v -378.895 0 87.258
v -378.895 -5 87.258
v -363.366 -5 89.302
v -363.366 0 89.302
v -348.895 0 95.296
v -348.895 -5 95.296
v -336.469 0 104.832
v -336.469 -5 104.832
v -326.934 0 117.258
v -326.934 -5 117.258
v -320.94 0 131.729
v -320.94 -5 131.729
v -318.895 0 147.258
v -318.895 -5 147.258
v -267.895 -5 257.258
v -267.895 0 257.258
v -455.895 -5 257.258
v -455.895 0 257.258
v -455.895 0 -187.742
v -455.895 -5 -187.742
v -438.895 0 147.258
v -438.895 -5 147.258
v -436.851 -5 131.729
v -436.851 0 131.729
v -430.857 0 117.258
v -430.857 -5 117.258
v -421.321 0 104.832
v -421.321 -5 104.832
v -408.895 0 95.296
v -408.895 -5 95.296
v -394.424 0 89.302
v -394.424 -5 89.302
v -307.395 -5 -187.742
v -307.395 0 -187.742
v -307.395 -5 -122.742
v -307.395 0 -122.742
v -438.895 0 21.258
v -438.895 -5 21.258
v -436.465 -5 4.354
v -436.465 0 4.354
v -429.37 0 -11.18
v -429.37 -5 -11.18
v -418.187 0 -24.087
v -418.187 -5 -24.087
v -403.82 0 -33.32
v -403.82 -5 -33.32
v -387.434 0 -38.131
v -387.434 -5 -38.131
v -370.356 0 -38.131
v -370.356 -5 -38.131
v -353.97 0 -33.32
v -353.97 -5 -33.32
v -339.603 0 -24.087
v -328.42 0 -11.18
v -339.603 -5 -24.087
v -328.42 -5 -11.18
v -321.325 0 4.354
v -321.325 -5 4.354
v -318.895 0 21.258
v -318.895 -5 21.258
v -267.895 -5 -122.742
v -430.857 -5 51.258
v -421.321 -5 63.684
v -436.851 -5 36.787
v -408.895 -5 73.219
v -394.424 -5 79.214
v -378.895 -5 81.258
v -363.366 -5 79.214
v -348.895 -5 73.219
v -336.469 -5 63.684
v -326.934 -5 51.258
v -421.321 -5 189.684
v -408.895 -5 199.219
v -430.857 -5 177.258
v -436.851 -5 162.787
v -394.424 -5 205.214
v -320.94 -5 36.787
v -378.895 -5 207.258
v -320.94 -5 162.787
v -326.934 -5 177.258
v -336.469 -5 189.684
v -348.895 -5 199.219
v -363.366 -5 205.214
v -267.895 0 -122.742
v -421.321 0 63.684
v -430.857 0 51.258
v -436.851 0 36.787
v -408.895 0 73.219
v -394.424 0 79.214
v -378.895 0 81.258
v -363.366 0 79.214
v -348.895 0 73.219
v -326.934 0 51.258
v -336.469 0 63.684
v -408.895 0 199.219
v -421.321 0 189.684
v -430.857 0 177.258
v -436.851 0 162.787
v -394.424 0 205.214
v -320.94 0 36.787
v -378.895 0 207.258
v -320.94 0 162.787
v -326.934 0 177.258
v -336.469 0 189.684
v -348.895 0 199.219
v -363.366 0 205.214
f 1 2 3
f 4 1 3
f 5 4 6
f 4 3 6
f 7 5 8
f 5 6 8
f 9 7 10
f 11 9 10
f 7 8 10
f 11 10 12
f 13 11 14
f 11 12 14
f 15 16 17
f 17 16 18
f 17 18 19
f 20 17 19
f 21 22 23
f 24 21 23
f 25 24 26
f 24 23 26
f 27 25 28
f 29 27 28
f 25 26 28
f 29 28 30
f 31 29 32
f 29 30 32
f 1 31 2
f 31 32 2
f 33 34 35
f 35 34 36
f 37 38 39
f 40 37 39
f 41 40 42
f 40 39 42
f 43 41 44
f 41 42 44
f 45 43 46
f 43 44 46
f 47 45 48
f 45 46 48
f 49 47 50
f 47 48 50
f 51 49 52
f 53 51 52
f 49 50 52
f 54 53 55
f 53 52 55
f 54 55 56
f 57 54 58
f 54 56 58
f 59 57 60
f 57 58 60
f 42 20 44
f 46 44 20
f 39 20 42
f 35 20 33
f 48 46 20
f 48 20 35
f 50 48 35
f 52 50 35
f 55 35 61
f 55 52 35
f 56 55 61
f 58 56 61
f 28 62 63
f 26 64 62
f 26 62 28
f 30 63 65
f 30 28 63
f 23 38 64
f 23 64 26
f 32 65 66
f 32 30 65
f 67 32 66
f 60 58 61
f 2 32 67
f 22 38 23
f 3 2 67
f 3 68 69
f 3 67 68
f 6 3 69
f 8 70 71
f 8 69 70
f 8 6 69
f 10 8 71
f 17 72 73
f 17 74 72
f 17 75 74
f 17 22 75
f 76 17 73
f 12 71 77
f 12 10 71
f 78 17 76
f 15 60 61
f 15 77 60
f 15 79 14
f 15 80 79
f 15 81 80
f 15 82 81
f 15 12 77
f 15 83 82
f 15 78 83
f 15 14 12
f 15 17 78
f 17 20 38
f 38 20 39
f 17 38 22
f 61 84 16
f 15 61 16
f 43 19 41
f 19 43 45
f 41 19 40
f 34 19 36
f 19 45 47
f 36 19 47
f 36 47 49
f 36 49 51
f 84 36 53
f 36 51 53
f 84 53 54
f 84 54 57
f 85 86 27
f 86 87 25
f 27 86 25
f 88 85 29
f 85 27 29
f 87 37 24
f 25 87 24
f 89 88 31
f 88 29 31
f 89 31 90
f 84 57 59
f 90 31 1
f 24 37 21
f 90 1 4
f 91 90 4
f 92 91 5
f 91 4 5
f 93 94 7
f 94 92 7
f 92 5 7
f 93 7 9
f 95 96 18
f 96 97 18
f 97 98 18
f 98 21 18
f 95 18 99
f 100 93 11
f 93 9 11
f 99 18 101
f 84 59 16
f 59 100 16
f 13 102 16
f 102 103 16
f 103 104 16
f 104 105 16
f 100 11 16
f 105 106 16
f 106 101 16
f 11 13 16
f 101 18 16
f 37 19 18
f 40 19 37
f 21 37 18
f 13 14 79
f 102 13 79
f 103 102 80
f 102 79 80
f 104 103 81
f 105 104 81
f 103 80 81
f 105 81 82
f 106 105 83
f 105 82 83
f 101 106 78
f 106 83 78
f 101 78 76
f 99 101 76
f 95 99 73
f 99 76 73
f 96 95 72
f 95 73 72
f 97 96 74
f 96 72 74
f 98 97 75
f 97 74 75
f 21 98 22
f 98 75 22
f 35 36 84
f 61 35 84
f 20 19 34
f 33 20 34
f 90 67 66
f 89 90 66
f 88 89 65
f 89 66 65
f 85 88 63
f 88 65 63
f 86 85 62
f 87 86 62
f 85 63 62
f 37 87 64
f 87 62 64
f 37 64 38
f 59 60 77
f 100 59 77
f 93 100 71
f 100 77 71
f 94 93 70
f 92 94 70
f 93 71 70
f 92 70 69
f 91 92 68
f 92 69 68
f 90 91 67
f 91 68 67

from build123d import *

# Parameters (mm, degrees)
F1_DEPTH = 5
F3_DEPTH = 5.001


with BuildPart() as f1:
    # F0 (on Front) → F1 (new body)
    with BuildSketch(Plane.XZ):
        Polygon((-267.89507, 257.257965), (-455.89507, 257.257965), (-455.89507, -187.742035), (-307.39507, -187.742035), (-307.39507, -122.742035), (-267.89507, -122.742035), align=None)
    extrude(amount=F1_DEPTH)

    # F2 (on face) → F3 (cut, through all)
    with BuildSketch(Plane.XZ.offset(5)):
        with BuildLine():
            ThreePointArc((-378.89507, 81.257965), (-421.321476, 63.684372), (-438.89507, 21.257965))
            ThreePointArc((-438.89507, 21.257965), (-378.89507, -38.742035), (-318.89507, 21.257965))
            ThreePointArc((-318.89507, 21.257965), (-336.468663, 63.684372), (-378.89507, 81.257965))
        make_face()
        with BuildLine():
            ThreePointArc((-318.89507, 147.257965), (-336.468663, 189.684372), (-378.89507, 207.257965))
            Line((-378.89507, 207.257965), (-378.89507, 147.257965))
            Line((-378.89507, 147.257965), (-378.89507, 87.257965))
            ThreePointArc((-378.89507, 87.257965), (-336.468663, 104.831558), (-318.89507, 147.257965))
        make_face()
        with BuildLine():
            Line((-378.89507, 147.257965), (-438.89507, 147.257965))
            ThreePointArc((-438.89507, 147.257965), (-421.321477, 104.831558), (-378.89507, 87.257965))
            Line((-378.89507, 87.257965), (-378.89507, 147.257965))
        make_face()
        with BuildLine():
            Line((-378.89507, 147.257965), (-378.89507, 207.257965))
            ThreePointArc((-378.89507, 207.257965), (-421.321477, 189.684372), (-438.89507, 147.257965))
            Line((-438.89507, 147.257965), (-378.89507, 147.257965))
        make_face()
    extrude(amount=-F3_DEPTH, mode=Mode.SUBTRACT)


solid = f1.part
